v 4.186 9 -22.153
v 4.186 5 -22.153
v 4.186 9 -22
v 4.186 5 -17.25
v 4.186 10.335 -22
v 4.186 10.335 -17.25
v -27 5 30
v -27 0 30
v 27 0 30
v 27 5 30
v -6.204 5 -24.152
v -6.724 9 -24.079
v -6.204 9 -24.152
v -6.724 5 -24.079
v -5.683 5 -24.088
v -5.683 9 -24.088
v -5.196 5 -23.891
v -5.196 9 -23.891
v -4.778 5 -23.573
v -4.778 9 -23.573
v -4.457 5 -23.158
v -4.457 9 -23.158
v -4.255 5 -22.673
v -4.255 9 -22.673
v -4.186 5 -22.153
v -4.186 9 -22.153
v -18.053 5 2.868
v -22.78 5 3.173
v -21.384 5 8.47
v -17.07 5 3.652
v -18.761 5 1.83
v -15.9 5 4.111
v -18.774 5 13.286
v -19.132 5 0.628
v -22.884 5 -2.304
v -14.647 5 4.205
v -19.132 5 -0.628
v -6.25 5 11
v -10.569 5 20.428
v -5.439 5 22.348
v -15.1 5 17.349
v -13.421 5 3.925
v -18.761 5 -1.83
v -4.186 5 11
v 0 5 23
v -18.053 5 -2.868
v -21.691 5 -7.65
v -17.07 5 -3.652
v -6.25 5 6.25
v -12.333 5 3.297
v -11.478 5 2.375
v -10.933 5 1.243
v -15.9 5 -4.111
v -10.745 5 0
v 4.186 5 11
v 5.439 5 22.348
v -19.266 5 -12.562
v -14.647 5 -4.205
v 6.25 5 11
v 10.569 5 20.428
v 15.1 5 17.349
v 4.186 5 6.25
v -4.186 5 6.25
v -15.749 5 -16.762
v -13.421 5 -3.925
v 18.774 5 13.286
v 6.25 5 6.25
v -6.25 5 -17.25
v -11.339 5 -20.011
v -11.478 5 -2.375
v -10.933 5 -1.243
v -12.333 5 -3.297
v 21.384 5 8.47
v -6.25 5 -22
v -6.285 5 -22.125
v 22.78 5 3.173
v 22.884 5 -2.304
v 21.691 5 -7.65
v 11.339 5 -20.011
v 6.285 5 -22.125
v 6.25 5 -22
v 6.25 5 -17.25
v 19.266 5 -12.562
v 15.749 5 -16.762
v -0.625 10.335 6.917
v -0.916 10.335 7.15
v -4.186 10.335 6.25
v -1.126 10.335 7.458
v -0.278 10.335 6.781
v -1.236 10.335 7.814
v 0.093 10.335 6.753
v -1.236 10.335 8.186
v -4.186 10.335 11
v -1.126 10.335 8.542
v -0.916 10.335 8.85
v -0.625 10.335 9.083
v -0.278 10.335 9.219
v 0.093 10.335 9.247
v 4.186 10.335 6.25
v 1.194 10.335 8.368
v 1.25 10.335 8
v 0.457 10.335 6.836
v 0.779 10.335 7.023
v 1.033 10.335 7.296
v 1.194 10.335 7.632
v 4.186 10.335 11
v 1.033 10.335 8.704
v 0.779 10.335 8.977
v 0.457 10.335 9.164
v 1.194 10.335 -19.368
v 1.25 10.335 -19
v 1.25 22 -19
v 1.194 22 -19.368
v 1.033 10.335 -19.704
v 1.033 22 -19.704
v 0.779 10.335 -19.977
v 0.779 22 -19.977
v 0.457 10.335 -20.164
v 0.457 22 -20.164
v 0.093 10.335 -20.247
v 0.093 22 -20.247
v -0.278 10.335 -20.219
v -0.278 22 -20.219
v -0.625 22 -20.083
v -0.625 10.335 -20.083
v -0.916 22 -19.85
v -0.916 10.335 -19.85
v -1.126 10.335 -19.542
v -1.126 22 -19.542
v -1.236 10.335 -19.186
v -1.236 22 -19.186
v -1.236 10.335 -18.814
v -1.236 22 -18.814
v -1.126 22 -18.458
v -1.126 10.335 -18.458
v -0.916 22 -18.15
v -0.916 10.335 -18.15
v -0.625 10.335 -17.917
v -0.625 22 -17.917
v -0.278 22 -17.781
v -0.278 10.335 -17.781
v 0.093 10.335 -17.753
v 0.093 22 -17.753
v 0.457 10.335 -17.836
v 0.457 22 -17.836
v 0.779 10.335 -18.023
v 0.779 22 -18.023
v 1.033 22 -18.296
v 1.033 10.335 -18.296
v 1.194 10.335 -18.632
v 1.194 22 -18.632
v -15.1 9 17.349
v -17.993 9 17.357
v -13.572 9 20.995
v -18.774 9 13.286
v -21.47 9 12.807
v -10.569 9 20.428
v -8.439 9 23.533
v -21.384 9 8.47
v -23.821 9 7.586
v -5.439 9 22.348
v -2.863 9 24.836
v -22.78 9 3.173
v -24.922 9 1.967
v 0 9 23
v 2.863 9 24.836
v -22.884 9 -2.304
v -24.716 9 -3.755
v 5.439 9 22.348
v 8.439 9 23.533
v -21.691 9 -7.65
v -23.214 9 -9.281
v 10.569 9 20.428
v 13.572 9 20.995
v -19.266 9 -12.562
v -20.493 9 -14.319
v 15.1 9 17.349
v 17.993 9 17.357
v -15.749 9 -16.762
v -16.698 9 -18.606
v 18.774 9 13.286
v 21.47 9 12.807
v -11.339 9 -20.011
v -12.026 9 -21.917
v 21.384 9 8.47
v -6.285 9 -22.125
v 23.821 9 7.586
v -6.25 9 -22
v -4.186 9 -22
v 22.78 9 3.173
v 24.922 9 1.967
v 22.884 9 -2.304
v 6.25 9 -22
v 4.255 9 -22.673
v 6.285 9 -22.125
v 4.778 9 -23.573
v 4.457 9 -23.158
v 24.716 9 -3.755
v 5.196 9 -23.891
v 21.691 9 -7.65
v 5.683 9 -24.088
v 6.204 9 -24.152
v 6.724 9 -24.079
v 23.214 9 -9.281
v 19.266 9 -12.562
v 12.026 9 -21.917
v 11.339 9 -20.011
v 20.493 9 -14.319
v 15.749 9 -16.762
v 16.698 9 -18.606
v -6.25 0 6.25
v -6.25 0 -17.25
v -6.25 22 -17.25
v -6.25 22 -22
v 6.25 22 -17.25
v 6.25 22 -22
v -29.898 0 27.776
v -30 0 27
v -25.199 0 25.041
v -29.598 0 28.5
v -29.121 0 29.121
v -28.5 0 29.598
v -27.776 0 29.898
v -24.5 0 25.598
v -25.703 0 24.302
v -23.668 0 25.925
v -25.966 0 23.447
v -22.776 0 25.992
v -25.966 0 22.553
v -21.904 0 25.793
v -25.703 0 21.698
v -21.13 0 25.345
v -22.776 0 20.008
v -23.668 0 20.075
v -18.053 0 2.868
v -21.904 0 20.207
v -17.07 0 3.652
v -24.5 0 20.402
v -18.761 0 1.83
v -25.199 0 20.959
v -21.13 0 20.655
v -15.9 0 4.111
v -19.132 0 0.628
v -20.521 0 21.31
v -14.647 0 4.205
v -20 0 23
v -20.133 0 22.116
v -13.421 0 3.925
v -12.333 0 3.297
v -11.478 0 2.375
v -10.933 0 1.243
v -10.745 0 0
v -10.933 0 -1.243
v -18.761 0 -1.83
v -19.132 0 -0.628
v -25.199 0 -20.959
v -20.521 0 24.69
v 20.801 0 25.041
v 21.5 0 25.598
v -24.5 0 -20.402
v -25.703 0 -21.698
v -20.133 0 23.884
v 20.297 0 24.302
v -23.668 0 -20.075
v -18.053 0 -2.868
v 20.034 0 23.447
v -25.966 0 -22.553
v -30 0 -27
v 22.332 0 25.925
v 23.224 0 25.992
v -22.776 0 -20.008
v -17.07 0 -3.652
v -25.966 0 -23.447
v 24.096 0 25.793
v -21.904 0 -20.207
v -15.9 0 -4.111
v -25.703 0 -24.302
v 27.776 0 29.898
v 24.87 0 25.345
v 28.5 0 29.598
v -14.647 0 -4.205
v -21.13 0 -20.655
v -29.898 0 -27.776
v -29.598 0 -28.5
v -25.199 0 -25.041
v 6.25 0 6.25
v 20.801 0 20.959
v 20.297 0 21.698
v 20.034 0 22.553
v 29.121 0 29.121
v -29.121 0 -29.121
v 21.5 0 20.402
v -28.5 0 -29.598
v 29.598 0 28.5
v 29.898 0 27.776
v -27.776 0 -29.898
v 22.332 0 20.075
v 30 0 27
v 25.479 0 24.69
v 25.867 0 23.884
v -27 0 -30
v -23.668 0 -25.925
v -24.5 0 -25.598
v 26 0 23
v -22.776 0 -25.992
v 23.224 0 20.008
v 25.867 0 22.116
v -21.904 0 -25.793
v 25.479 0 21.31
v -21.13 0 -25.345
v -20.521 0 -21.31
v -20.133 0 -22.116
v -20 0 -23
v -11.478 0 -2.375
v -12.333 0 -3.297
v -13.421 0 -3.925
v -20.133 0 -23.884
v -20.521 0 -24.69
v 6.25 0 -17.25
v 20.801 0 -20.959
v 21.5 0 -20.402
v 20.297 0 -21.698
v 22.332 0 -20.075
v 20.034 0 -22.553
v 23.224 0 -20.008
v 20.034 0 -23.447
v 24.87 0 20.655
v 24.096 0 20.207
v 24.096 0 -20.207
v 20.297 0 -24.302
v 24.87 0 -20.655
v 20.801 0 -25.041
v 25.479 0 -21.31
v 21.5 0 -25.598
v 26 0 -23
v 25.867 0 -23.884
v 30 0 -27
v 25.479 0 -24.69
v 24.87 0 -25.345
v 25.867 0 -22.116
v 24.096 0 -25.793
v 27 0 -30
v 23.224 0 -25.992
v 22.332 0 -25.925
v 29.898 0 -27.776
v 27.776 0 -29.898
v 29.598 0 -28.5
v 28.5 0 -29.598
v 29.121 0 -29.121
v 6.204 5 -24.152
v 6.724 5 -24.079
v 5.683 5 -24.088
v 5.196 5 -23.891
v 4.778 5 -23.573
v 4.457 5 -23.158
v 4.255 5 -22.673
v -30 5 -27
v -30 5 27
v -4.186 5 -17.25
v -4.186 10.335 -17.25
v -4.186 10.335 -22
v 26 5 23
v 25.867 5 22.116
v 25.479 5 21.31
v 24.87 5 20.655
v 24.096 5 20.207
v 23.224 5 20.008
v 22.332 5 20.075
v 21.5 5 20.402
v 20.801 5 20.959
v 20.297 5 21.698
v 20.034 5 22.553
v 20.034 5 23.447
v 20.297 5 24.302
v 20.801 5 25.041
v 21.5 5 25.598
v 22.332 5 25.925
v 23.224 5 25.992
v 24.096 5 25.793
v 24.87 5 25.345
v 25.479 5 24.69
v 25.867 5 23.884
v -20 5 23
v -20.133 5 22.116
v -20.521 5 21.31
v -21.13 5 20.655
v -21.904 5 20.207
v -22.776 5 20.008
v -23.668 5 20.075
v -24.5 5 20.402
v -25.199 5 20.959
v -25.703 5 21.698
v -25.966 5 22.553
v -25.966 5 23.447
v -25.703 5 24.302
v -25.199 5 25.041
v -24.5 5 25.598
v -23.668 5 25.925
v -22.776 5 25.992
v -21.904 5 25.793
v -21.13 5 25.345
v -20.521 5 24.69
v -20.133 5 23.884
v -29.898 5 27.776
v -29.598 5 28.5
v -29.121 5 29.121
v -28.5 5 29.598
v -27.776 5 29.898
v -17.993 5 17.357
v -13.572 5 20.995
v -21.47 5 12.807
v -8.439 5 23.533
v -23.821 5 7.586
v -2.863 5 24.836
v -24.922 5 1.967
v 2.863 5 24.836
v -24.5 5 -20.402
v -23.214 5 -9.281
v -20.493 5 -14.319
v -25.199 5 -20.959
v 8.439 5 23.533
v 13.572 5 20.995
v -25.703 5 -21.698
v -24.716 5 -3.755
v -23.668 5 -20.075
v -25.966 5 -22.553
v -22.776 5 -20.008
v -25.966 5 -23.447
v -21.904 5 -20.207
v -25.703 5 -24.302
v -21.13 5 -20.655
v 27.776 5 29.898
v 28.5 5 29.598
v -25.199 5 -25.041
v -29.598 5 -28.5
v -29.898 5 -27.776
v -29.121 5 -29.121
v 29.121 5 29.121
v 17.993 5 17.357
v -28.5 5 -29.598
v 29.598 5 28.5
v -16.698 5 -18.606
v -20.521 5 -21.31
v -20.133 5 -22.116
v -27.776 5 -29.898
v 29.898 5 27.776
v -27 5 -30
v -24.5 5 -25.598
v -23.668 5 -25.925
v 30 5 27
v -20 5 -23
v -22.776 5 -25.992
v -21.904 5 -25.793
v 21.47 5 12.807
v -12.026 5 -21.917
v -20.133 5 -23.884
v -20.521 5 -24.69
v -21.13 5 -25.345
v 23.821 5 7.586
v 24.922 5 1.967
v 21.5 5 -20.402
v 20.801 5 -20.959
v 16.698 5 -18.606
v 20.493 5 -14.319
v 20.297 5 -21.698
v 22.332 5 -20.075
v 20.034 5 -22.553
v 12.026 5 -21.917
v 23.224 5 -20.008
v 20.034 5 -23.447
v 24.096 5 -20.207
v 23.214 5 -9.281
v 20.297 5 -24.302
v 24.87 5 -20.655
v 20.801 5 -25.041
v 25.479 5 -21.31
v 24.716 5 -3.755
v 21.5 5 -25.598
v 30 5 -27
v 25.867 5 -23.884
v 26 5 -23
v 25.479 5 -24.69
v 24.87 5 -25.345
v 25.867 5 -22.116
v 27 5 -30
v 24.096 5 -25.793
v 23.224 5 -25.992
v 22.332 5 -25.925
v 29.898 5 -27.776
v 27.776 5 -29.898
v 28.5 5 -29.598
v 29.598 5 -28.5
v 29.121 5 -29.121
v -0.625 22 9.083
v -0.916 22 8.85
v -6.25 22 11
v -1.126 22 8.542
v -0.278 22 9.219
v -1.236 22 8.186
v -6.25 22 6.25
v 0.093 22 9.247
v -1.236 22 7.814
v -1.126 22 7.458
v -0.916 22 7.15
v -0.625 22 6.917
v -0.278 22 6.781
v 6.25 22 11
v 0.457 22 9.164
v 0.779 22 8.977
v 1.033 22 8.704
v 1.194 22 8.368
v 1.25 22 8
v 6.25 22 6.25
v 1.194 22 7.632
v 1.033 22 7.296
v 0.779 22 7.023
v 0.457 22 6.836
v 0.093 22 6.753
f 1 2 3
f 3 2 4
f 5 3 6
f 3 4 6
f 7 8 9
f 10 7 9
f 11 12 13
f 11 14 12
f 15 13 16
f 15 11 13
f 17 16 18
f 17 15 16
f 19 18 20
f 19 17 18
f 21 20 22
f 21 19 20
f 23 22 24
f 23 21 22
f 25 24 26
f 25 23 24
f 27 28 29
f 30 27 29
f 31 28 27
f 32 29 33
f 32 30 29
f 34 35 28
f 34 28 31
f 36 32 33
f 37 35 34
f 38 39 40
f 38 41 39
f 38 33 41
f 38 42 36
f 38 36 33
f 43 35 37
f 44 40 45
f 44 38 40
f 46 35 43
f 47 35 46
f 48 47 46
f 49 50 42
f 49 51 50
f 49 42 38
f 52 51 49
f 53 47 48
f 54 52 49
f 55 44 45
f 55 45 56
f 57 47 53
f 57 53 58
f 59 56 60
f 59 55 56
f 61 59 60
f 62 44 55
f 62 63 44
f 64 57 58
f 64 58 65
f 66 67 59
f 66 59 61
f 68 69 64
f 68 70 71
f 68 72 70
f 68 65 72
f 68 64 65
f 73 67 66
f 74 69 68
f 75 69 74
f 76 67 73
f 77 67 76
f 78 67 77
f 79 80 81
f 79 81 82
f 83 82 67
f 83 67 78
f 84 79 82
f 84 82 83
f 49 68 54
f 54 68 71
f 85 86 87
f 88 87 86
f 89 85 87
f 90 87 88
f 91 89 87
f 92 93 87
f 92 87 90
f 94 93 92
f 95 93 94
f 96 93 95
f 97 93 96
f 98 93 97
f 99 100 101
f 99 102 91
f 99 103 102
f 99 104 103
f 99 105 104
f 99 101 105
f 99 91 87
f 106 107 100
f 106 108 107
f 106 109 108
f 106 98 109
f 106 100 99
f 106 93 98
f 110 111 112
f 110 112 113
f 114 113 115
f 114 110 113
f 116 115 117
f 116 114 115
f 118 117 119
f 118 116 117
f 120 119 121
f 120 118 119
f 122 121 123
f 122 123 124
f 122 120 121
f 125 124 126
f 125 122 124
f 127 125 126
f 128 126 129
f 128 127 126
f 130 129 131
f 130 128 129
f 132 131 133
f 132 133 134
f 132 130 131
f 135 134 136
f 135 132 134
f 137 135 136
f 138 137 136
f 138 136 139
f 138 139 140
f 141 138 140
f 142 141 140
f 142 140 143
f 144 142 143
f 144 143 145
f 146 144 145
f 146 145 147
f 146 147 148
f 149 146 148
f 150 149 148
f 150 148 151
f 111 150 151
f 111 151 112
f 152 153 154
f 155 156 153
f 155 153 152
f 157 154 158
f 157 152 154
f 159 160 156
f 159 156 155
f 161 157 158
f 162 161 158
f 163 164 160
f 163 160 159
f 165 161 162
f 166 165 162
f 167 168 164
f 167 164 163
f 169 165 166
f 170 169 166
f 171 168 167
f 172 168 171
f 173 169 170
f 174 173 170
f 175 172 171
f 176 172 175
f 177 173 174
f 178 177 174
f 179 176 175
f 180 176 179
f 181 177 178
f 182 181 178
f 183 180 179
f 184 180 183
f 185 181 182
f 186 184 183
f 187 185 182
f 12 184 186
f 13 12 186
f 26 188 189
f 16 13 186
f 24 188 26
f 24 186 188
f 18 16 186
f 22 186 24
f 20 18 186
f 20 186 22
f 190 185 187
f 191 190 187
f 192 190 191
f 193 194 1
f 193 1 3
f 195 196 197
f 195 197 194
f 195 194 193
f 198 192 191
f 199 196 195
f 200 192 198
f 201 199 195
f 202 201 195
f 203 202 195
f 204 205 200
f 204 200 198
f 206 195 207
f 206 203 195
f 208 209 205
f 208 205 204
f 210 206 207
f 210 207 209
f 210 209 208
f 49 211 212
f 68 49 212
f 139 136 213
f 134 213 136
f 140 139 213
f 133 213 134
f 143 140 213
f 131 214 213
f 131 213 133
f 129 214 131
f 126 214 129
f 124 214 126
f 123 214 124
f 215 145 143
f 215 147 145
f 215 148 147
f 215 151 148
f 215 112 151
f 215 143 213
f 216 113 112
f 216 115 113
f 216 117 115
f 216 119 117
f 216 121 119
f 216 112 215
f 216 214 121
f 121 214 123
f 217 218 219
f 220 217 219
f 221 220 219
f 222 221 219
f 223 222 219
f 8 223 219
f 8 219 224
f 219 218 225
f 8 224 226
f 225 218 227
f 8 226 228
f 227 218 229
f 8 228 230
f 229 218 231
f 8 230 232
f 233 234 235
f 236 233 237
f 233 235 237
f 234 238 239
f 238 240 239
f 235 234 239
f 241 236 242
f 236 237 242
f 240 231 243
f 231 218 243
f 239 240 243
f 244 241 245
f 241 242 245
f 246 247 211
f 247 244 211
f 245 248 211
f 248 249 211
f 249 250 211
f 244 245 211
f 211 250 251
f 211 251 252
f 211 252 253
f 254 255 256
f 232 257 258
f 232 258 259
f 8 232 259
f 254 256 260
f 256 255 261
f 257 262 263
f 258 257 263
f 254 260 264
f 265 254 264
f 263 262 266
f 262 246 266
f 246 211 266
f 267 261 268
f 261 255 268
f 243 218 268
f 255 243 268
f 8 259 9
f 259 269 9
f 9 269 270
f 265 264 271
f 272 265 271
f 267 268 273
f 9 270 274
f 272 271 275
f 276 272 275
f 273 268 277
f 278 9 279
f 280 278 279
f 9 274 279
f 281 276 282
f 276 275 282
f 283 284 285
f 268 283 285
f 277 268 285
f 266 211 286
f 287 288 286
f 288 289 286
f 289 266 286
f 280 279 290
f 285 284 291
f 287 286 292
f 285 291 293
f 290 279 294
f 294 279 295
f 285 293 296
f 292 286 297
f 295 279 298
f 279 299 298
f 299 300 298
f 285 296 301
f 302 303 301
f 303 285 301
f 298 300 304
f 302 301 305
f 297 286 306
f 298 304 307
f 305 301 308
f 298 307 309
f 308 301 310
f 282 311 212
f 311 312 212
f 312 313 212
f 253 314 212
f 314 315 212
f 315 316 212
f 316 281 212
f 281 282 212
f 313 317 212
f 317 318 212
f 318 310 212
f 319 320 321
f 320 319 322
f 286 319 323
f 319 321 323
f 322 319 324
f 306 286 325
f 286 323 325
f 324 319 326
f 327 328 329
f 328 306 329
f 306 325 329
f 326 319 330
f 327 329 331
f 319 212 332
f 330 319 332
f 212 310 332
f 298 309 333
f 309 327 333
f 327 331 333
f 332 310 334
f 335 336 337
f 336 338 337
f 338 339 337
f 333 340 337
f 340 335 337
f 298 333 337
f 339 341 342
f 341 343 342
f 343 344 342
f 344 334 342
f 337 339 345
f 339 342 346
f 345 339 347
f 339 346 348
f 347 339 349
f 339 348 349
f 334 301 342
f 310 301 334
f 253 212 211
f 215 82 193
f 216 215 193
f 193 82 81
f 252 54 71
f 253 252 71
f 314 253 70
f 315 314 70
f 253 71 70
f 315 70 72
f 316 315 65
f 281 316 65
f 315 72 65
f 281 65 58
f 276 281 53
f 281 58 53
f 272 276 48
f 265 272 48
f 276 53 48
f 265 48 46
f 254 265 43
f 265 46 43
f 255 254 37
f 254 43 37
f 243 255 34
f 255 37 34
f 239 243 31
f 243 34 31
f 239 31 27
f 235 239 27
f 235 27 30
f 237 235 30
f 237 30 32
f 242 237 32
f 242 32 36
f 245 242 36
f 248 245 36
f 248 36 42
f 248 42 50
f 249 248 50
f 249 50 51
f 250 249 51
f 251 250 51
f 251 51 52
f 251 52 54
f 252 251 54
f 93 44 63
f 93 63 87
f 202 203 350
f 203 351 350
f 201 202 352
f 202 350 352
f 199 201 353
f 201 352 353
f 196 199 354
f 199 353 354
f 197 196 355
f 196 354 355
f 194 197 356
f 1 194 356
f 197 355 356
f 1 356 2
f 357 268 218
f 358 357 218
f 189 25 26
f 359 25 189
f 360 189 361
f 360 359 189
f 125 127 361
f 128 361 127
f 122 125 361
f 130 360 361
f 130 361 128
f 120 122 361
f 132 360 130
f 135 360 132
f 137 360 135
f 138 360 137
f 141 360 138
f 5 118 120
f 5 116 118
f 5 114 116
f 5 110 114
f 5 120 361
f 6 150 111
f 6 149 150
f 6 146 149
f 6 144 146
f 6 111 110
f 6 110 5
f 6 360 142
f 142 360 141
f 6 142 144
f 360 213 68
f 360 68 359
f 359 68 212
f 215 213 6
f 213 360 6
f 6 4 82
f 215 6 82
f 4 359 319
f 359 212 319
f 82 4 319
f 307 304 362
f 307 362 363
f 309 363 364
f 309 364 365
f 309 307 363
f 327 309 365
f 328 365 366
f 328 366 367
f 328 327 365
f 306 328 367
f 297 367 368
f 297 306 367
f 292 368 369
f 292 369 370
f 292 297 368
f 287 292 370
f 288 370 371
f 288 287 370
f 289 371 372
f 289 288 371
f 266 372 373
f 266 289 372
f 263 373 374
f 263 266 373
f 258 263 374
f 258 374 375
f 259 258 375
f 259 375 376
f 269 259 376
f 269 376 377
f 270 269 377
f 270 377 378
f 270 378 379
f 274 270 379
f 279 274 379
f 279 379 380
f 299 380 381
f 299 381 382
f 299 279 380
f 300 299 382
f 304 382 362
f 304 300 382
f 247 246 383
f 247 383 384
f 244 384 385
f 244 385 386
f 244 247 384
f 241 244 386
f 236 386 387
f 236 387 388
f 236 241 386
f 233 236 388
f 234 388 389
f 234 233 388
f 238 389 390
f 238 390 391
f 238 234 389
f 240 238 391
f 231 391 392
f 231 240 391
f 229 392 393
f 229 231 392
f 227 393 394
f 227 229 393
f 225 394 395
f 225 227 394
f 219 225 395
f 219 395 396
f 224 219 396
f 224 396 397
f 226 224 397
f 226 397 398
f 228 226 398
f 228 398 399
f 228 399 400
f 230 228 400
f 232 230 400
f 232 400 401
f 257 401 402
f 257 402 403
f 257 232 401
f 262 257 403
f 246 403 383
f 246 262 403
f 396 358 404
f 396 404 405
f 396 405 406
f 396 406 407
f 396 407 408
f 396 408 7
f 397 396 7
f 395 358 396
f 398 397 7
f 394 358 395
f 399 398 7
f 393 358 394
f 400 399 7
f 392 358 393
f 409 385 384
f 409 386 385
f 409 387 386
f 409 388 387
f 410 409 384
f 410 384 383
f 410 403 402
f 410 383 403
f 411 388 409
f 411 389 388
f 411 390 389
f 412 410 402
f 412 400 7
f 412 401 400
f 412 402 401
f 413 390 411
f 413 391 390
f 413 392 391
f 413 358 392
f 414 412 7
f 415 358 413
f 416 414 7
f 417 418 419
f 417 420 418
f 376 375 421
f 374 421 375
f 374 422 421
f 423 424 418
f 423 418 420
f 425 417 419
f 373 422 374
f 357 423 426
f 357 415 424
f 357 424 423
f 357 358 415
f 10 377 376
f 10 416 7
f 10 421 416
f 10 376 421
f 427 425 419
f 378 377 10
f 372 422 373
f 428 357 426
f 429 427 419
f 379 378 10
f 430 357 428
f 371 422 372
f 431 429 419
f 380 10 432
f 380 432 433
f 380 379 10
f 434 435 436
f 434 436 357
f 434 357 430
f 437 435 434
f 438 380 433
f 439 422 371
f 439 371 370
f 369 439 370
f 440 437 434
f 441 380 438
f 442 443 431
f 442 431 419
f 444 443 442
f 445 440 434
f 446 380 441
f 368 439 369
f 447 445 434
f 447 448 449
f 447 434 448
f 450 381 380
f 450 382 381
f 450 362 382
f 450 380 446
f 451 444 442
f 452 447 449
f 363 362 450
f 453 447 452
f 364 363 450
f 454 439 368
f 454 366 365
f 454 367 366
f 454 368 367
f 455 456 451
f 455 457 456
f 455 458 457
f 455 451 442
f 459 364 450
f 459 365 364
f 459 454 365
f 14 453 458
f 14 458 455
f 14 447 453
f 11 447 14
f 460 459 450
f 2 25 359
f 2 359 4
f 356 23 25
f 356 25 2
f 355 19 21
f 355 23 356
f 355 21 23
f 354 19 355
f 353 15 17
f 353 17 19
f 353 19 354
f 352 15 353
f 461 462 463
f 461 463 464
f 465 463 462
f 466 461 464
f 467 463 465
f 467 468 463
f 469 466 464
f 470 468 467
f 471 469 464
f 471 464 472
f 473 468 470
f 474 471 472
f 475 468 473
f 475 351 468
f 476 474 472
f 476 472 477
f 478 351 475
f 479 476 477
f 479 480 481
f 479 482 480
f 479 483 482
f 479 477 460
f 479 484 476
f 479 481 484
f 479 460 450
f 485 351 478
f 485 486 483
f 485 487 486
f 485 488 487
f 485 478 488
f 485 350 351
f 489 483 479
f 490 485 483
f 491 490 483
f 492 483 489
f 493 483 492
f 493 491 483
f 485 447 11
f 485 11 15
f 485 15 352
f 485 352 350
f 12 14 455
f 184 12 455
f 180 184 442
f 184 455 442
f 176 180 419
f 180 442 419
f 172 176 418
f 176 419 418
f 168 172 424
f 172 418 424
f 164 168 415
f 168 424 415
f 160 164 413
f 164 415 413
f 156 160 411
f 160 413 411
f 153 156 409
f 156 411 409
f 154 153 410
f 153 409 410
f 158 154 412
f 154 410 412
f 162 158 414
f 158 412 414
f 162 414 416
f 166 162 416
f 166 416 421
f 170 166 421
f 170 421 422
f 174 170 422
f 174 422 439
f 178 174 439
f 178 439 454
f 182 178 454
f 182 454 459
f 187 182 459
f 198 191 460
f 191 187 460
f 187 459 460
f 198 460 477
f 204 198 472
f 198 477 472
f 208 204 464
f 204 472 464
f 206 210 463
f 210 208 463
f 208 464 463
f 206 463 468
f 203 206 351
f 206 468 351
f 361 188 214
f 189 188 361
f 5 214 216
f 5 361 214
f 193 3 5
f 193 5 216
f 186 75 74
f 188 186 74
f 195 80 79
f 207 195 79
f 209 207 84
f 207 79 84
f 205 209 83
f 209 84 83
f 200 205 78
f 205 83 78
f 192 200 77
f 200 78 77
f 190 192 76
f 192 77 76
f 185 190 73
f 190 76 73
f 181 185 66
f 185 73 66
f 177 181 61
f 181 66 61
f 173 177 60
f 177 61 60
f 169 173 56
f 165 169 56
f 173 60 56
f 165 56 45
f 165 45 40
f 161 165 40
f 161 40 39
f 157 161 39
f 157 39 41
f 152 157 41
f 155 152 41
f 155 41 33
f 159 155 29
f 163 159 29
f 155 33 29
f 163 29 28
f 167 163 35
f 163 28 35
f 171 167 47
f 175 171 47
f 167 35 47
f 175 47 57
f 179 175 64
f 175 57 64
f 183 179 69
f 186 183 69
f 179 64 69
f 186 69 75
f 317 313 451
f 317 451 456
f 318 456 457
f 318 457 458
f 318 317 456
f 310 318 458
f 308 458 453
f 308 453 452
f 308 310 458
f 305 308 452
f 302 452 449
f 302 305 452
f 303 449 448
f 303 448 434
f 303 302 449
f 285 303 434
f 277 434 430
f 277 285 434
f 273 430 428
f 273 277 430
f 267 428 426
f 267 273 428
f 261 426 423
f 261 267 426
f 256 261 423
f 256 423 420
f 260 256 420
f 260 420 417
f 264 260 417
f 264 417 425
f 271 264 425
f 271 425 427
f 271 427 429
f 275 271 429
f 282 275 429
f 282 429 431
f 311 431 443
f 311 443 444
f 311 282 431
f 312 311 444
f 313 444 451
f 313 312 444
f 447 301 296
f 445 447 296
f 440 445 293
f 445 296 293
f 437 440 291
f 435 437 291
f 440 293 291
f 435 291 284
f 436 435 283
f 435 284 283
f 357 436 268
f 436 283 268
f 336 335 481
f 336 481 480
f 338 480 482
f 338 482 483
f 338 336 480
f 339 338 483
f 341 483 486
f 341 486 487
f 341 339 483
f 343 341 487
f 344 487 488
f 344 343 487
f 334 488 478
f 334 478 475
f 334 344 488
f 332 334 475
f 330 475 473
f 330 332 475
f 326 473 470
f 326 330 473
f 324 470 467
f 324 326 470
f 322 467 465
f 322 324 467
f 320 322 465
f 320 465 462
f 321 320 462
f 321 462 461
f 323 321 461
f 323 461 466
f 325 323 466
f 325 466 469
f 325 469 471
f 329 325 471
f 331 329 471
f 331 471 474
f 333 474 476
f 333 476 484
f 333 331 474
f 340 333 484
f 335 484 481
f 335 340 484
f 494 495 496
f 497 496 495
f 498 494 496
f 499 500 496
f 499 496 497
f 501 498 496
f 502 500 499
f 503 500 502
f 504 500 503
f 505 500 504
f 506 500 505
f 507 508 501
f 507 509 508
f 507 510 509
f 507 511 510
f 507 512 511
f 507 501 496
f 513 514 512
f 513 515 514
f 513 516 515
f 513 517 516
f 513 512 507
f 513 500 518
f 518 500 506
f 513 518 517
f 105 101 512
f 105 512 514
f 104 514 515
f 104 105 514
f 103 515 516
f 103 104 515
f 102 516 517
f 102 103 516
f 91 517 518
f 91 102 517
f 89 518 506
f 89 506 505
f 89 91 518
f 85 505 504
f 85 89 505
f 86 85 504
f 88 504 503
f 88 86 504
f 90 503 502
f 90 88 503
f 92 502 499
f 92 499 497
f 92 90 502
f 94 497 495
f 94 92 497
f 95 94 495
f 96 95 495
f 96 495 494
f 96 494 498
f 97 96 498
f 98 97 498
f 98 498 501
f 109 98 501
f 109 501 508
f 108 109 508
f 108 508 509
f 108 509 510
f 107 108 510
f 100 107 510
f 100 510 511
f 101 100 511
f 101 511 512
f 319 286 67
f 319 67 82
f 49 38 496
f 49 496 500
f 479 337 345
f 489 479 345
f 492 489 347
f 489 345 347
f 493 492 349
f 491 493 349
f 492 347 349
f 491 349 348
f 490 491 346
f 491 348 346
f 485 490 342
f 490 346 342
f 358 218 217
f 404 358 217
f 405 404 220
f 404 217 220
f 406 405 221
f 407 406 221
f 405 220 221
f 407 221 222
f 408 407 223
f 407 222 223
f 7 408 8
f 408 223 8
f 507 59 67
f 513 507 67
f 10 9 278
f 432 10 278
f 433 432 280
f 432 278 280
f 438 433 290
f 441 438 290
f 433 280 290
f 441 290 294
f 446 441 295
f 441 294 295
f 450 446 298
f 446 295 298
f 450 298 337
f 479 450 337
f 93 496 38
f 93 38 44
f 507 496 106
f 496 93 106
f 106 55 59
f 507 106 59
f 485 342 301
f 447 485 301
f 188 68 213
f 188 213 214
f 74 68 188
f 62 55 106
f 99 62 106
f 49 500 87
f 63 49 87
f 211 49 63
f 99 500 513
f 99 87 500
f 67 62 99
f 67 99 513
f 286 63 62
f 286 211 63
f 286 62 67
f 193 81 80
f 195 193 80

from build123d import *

# Parameters (mm, degrees)
SKETCH_1_R          = 3
SKETCH_1_W          = 12.5
SKETCH_1_H          = 23.5
EXTRUDE_1_DEPTH     = 5
SKETCH_2_W          = 12.5
SKETCH_2_H          = 4.75
SKETCH_2_R          = 1.25
EXTRUDE_2_DEPTH     = 17
SKETCH_4_R          = 25
EXTRUDE_7_DEPTH     = 4
SKETCH_5_W          = 8.371461974
SKETCH_5_H          = 5.334847295
CUT_EXTRUDE_1_DEPTH = 42
FILLET_1_R          = 2
SKETCH_6_R          = 4.21665728
CUT_EXTRUDE_2_DEPTH = 10


with BuildPart() as part:
    # 草图1 → 凸台-拉伸1 (new body)
    with BuildSketch(Plane(origin=(0, 0, 0), x_dir=(1, 0, 0), z_dir=(0, 1, 0))):
        with BuildLine():
            Line((27, 30), (-27, 30))
            ThreePointArc((-27, 30), (-29.121320344, 29.121320344), (-30, 27))
            Line((-30, 27), (-30, -27))
            ThreePointArc((-30, -27), (-29.121320344, -29.121320344), (-27, -30))
            Line((-27, -30), (27, -30))
            ThreePointArc((27, -30), (29.121320344, -29.121320344), (30, -27))
            Line((30, -27), (30, 27))
            ThreePointArc((30, 27), (29.121320344, 29.121320344), (27, 30))
        make_face()
        with Locations((-23, 23)):
            Circle(SKETCH_1_R, mode=Mode.SUBTRACT)
        with Locations((23, 23)):
            Circle(SKETCH_1_R, mode=Mode.SUBTRACT)
        with Locations((23, -23)):
            Circle(SKETCH_1_R, mode=Mode.SUBTRACT)
        with Locations((-23, -23)):
            Circle(SKETCH_1_R, mode=Mode.SUBTRACT)
        with Locations((0, 5.5)):
            Rectangle(SKETCH_1_W, SKETCH_1_H, mode=Mode.SUBTRACT)
    extrude(amount=EXTRUDE_1_DEPTH)

    # 草图2 → 凸台-拉伸2 (add)
    with BuildSketch(Plane(origin=(0, 5, 0), x_dir=(1, 0, 0), z_dir=(0, 1, 0))):
        with Locations((0, 19.625)):
            Rectangle(SKETCH_2_W, SKETCH_2_H)
        with Locations((0, 19)):
            Circle(SKETCH_2_R, mode=Mode.SUBTRACT)
        with Locations((0, -8.625)):
            Rectangle(SKETCH_2_W, SKETCH_2_H)
        with Locations((0, -8)):
            Circle(SKETCH_2_R, mode=Mode.SUBTRACT)
    extrude(amount=EXTRUDE_2_DEPTH)

    # 草图4 → 凸台-拉伸7 (add)
    with BuildSketch(Plane(origin=(0, 5, 0), x_dir=(1, 0, 0), z_dir=(0, 1, 0))):
        Circle(SKETCH_4_R)
        with BuildLine():
            Line((-6.285373074, 22.124513222), (-6.25, 22))
            Line((-6.25, 22), (6.25, 22))
            Line((6.25, 22), (6.285373074, 22.124513222))
            ThreePointArc((6.285373074, 22.124513222), (0, -23), (-6.285373074, 22.124513222))
        make_face(mode=Mode.SUBTRACT)
    extrude(amount=EXTRUDE_7_DEPTH)

    # 草图5 → 切除-拉伸1 (cut)
    with BuildSketch(Plane.XY.offset(11)):
        with Locations((0, 7.667423648)):
            Rectangle(SKETCH_5_W, SKETCH_5_H)
    extrude(amount=-CUT_EXTRUDE_1_DEPTH, mode=Mode.SUBTRACT)

    # 圆角1
    fillet_1_edges = [part.edges().sort_by_distance(p)[0] for p in [
        (-4.185730987, 7, -24.647102388),
        (4.185730987, 7, -24.647102388),
    ]]
    fillet(fillet_1_edges, radius=FILLET_1_R)

    # 草图6 → 切除-拉伸2 (cut)
    with BuildSketch(Plane(origin=(0, 5, 0), x_dir=(1, 0, 0), z_dir=(0, 1, 0))):
        with Locations((-14.961939604, 0)):
            Circle(SKETCH_6_R)
    extrude(amount=-CUT_EXTRUDE_2_DEPTH, mode=Mode.SUBTRACT)


solid = part.part
